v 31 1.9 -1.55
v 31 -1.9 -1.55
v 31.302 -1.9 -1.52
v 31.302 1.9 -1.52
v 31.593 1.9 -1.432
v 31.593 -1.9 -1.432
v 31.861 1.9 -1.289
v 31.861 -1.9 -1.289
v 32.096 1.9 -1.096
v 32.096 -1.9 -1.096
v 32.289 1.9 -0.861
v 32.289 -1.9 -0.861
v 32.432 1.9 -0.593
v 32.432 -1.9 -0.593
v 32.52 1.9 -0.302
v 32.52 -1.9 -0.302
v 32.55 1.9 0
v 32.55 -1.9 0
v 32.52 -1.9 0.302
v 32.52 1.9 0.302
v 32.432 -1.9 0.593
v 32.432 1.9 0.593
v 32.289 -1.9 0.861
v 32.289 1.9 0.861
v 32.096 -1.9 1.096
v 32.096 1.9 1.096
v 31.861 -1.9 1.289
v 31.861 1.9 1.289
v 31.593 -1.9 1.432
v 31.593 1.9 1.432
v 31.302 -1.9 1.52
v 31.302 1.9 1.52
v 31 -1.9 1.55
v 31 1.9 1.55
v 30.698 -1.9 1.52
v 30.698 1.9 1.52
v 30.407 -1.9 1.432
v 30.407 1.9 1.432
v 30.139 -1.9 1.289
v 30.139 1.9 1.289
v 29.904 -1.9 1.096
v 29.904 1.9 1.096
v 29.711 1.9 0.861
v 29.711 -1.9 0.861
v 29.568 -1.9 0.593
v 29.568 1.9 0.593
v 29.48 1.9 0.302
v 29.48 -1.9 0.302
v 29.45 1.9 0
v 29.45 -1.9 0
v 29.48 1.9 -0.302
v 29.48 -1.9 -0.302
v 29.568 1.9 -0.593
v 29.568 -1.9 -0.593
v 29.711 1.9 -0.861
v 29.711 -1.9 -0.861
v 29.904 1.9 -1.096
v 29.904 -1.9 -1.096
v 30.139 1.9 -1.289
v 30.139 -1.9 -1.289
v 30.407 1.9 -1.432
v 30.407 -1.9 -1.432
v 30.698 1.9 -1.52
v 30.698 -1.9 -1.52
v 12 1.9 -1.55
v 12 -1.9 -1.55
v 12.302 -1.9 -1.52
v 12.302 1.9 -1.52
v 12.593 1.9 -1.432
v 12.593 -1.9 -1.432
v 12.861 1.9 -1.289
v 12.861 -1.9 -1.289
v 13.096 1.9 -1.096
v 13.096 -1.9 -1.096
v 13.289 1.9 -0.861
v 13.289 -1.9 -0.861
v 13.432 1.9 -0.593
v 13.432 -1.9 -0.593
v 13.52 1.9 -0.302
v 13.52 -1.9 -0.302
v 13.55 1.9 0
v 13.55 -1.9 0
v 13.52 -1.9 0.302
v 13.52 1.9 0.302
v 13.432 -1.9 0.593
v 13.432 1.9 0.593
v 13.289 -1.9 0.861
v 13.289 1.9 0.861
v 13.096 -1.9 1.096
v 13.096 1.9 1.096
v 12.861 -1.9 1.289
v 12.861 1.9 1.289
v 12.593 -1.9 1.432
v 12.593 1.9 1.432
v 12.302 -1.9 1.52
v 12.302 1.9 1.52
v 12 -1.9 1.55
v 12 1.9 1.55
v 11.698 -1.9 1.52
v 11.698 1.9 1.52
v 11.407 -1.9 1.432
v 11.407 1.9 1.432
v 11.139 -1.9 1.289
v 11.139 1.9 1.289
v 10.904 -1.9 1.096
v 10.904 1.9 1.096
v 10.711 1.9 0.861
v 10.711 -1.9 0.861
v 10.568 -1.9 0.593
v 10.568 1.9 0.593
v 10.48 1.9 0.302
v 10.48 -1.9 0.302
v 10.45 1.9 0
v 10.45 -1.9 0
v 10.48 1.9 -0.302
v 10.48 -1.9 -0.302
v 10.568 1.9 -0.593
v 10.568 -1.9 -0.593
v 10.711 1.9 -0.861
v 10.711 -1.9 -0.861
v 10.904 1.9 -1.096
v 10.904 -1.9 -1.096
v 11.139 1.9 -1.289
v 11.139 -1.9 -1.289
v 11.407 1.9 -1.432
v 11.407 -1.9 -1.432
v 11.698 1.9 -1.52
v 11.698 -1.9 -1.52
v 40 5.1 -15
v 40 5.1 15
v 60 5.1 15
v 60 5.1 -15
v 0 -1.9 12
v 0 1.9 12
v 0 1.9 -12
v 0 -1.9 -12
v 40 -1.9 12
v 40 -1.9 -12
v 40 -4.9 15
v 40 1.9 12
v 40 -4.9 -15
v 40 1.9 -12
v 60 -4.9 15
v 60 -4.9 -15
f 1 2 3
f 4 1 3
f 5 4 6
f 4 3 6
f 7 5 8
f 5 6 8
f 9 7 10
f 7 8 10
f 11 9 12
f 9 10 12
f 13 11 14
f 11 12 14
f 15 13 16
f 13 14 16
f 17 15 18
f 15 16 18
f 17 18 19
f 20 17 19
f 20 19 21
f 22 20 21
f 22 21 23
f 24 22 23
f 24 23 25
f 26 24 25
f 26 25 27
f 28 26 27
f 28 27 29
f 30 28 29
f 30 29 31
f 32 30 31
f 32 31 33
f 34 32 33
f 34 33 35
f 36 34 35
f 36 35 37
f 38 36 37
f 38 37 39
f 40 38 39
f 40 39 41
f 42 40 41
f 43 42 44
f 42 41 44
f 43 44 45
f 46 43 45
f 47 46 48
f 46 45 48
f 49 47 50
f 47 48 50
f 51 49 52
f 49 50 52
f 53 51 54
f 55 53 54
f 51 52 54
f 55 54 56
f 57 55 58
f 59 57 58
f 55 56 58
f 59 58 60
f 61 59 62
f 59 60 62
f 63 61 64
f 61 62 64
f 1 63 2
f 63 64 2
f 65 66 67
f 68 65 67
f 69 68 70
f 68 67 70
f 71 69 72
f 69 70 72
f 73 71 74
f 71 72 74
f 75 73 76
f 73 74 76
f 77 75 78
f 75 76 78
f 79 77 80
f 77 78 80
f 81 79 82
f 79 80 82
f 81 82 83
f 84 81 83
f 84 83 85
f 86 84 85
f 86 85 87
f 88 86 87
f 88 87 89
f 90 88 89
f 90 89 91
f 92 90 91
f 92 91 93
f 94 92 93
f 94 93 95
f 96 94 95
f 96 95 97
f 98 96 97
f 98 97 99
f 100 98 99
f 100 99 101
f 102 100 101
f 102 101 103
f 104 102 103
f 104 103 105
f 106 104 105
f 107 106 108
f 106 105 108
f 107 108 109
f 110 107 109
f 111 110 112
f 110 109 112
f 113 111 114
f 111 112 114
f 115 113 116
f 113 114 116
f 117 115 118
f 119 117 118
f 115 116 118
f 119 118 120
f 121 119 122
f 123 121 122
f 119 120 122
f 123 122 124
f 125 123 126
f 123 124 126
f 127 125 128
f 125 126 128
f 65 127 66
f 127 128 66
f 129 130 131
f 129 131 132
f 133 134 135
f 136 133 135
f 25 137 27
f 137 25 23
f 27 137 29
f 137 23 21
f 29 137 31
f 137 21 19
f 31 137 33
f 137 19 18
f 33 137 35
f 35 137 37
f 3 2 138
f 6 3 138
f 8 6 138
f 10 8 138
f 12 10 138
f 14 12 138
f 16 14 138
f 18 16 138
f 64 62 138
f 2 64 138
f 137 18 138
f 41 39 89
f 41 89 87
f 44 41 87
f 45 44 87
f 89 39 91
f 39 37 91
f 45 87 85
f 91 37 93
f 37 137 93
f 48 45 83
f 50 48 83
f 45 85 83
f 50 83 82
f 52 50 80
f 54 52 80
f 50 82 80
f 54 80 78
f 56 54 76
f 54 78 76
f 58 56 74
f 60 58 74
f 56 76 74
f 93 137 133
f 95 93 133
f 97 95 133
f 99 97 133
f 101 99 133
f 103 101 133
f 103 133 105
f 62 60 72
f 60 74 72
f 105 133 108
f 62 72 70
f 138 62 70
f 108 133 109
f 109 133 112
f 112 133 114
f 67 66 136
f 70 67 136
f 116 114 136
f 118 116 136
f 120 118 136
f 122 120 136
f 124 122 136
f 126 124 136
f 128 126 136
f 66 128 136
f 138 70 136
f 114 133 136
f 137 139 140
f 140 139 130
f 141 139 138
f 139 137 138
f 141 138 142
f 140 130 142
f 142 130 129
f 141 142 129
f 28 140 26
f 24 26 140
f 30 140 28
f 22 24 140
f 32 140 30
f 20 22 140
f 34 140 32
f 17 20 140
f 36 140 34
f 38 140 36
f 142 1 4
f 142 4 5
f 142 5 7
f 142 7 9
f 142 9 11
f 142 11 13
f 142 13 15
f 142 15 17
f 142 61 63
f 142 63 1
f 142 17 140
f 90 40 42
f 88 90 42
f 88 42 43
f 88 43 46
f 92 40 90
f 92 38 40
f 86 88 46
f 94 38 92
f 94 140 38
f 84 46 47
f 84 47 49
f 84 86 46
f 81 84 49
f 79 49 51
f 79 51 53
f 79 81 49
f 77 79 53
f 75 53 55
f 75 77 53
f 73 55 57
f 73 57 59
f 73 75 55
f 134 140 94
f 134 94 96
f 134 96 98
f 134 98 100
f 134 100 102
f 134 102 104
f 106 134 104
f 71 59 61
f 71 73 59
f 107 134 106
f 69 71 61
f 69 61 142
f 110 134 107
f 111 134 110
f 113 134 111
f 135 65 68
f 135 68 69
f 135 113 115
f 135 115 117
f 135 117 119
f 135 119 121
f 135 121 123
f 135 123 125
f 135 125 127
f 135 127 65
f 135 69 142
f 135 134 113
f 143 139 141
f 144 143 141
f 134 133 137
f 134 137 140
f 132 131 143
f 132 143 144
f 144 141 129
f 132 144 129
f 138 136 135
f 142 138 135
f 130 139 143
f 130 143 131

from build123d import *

# Parameters (mm, degrees)
SKETCH1_W           = 24
SKETCH1_H           = 3.8
BOSS_EXTRUDE1_DEPTH = 40
SKETCH2_R           = 1.55
CUT_EXTRUDE1_DEPTH  = 42.933757285
SKETCH3_W           = 30
SKETCH3_H           = 10
BOSS_EXTRUDE2_DEPTH = 20


with BuildPart() as part:
    # Sketch1 → Boss-Extrude1 (new body)
    with BuildSketch(Plane(origin=(0, 0, 0), x_dir=(0, 0, -1), z_dir=(1, 0, 0))):
        Rectangle(SKETCH1_W, SKETCH1_H)
    extrude(amount=BOSS_EXTRUDE1_DEPTH)

    # Sketch2 → Cut-Extrude1 (cut, through all)
    with BuildSketch(Plane.XZ.offset(1.9)):
        with Locations(Location((12, 0, 0), (0, 0, 270))):
            Circle(SKETCH2_R)
        with Locations(Location((31, 0, 0), (0, 0, 270))):
            Circle(SKETCH2_R)
    extrude(amount=-CUT_EXTRUDE1_DEPTH, mode=Mode.SUBTRACT)

    # Sketch3 → Boss-Extrude2 (add)
    with BuildSketch(Plane(origin=(40, 0, 0), x_dir=(0, 0, -1), z_dir=(1, 0, 0))):
        with Locations((0, 0.1)):
            Rectangle(SKETCH3_W, SKETCH3_H)
    extrude(amount=BOSS_EXTRUDE2_DEPTH)


solid = part.part
